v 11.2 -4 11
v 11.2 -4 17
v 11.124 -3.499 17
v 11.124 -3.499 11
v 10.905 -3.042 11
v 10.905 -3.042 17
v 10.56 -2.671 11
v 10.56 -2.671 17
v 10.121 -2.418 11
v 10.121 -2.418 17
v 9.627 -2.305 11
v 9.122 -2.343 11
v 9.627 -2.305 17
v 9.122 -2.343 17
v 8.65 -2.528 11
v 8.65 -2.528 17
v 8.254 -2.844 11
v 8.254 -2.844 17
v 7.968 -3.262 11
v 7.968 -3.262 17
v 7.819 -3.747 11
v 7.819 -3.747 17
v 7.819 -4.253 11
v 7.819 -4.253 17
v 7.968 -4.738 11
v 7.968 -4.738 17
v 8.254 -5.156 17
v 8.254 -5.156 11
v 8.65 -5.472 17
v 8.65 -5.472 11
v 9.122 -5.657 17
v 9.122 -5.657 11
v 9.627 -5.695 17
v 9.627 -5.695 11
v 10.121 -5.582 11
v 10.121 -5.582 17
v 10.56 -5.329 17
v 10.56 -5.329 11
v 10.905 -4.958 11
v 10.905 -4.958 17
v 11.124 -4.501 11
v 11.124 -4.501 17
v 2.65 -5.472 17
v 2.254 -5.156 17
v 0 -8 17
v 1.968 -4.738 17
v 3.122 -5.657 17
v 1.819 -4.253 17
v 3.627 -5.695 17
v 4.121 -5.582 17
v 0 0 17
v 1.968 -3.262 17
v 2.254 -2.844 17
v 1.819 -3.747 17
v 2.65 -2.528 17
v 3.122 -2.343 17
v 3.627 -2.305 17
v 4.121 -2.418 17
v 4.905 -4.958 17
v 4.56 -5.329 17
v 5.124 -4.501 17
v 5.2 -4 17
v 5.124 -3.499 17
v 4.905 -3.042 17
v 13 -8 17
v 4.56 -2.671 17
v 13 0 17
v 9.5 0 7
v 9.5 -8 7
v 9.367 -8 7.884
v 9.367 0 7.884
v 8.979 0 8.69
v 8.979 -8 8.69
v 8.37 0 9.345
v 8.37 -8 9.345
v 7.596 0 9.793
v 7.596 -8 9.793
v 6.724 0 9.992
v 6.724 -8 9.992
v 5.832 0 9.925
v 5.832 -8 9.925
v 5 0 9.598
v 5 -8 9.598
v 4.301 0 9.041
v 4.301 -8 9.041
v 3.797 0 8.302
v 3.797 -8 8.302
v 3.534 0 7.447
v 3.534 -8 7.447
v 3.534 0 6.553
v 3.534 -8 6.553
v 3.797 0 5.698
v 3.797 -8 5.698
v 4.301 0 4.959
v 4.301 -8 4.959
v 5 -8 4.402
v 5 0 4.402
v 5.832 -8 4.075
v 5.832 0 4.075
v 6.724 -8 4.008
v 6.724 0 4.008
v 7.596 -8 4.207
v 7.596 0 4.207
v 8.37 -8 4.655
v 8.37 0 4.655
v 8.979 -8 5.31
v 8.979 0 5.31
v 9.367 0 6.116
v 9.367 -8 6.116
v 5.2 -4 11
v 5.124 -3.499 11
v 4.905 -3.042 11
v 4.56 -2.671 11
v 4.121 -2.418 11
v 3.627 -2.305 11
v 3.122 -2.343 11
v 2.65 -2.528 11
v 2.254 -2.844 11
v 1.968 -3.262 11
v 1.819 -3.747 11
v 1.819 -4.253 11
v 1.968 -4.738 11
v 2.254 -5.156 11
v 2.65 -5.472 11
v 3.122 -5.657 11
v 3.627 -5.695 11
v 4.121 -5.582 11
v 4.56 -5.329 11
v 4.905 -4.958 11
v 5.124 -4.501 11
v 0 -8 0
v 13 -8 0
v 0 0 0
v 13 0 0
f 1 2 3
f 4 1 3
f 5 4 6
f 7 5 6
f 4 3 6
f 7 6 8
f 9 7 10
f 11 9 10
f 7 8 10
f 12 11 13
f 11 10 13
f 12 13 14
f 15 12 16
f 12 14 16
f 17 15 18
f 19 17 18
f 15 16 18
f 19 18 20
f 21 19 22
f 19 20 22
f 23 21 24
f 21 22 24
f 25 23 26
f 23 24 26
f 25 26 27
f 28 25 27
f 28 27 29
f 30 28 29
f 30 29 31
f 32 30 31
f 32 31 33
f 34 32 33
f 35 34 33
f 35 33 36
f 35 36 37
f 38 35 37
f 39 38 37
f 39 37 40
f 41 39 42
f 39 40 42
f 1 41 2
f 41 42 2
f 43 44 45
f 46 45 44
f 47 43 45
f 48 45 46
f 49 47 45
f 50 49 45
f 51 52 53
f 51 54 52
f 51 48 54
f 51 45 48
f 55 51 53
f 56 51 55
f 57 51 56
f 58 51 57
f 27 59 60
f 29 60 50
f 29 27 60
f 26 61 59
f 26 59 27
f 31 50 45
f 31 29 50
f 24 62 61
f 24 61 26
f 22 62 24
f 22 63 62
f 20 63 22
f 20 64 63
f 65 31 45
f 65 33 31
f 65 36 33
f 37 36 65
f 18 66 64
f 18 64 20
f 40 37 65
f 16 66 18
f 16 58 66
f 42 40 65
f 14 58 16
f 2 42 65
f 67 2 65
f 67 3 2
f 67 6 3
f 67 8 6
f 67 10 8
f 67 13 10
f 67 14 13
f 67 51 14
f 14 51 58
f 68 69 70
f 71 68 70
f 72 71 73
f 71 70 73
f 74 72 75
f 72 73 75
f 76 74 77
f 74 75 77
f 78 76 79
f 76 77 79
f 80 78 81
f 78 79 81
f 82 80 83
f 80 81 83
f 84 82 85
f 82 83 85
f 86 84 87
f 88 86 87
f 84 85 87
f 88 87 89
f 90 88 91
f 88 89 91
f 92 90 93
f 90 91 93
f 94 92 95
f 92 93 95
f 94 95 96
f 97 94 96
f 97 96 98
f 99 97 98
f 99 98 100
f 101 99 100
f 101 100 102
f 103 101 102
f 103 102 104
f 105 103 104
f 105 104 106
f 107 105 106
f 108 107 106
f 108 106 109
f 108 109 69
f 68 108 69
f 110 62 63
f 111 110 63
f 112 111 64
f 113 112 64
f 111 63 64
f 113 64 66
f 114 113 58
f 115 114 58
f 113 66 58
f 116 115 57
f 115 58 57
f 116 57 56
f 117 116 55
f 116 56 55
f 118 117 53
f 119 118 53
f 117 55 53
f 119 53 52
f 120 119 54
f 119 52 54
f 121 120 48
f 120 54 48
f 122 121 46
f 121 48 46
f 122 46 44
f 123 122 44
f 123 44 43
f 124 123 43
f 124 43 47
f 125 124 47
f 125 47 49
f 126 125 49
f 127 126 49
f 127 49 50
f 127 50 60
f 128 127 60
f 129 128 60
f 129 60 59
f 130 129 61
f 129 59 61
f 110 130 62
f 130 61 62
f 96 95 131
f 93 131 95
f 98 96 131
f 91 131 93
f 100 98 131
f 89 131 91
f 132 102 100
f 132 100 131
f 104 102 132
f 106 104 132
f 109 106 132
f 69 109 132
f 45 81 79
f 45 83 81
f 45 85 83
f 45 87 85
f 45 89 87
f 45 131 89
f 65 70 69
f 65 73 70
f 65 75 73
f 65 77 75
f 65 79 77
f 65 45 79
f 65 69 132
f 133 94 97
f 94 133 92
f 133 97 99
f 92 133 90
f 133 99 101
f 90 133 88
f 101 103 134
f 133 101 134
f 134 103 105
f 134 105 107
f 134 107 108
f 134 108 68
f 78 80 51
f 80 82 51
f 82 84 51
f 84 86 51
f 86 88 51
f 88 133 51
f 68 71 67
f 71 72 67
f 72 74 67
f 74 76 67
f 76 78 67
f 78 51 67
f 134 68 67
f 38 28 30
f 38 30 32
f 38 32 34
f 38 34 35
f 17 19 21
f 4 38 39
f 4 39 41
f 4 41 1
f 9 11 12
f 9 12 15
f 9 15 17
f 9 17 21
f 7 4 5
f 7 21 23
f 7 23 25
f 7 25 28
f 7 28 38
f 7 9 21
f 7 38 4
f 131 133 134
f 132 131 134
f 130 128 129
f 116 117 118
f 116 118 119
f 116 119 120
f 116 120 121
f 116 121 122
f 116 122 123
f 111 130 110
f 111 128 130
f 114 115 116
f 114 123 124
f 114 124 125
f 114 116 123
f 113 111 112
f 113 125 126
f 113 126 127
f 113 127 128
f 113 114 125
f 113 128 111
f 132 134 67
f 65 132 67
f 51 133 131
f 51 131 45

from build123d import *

# Parameters (mm, degrees)
F0_W     = 13
F0_H     = 17
F1_DEPTH = 8
F2_R     = 1.7
F3_DEPTH = 6
F4_R     = 3
F5_DEPTH = 25


with BuildPart() as f1:
    # F0 (on Front) → F1 (new body)
    with BuildSketch(Plane.XZ):
        with Locations((6.5, 8.5)):
            Rectangle(F0_W, F0_H)
    extrude(amount=F1_DEPTH)

    # F2 (on face) → F3 (cut)
    with BuildSketch(Plane.XY.offset(17)):
        with Locations((3.5, -4)):
            Circle(F2_R)
        with Locations((9.5, -4)):
            Circle(F2_R)
    extrude(amount=-F3_DEPTH, mode=Mode.SUBTRACT)

    # F4 (on face) → F5 (cut)
    with BuildSketch(Plane.XZ.offset(8)):
        with Locations((6.5, 7)):
            Circle(F4_R)
    extrude(amount=-F5_DEPTH, mode=Mode.SUBTRACT)


solid = f1.part
